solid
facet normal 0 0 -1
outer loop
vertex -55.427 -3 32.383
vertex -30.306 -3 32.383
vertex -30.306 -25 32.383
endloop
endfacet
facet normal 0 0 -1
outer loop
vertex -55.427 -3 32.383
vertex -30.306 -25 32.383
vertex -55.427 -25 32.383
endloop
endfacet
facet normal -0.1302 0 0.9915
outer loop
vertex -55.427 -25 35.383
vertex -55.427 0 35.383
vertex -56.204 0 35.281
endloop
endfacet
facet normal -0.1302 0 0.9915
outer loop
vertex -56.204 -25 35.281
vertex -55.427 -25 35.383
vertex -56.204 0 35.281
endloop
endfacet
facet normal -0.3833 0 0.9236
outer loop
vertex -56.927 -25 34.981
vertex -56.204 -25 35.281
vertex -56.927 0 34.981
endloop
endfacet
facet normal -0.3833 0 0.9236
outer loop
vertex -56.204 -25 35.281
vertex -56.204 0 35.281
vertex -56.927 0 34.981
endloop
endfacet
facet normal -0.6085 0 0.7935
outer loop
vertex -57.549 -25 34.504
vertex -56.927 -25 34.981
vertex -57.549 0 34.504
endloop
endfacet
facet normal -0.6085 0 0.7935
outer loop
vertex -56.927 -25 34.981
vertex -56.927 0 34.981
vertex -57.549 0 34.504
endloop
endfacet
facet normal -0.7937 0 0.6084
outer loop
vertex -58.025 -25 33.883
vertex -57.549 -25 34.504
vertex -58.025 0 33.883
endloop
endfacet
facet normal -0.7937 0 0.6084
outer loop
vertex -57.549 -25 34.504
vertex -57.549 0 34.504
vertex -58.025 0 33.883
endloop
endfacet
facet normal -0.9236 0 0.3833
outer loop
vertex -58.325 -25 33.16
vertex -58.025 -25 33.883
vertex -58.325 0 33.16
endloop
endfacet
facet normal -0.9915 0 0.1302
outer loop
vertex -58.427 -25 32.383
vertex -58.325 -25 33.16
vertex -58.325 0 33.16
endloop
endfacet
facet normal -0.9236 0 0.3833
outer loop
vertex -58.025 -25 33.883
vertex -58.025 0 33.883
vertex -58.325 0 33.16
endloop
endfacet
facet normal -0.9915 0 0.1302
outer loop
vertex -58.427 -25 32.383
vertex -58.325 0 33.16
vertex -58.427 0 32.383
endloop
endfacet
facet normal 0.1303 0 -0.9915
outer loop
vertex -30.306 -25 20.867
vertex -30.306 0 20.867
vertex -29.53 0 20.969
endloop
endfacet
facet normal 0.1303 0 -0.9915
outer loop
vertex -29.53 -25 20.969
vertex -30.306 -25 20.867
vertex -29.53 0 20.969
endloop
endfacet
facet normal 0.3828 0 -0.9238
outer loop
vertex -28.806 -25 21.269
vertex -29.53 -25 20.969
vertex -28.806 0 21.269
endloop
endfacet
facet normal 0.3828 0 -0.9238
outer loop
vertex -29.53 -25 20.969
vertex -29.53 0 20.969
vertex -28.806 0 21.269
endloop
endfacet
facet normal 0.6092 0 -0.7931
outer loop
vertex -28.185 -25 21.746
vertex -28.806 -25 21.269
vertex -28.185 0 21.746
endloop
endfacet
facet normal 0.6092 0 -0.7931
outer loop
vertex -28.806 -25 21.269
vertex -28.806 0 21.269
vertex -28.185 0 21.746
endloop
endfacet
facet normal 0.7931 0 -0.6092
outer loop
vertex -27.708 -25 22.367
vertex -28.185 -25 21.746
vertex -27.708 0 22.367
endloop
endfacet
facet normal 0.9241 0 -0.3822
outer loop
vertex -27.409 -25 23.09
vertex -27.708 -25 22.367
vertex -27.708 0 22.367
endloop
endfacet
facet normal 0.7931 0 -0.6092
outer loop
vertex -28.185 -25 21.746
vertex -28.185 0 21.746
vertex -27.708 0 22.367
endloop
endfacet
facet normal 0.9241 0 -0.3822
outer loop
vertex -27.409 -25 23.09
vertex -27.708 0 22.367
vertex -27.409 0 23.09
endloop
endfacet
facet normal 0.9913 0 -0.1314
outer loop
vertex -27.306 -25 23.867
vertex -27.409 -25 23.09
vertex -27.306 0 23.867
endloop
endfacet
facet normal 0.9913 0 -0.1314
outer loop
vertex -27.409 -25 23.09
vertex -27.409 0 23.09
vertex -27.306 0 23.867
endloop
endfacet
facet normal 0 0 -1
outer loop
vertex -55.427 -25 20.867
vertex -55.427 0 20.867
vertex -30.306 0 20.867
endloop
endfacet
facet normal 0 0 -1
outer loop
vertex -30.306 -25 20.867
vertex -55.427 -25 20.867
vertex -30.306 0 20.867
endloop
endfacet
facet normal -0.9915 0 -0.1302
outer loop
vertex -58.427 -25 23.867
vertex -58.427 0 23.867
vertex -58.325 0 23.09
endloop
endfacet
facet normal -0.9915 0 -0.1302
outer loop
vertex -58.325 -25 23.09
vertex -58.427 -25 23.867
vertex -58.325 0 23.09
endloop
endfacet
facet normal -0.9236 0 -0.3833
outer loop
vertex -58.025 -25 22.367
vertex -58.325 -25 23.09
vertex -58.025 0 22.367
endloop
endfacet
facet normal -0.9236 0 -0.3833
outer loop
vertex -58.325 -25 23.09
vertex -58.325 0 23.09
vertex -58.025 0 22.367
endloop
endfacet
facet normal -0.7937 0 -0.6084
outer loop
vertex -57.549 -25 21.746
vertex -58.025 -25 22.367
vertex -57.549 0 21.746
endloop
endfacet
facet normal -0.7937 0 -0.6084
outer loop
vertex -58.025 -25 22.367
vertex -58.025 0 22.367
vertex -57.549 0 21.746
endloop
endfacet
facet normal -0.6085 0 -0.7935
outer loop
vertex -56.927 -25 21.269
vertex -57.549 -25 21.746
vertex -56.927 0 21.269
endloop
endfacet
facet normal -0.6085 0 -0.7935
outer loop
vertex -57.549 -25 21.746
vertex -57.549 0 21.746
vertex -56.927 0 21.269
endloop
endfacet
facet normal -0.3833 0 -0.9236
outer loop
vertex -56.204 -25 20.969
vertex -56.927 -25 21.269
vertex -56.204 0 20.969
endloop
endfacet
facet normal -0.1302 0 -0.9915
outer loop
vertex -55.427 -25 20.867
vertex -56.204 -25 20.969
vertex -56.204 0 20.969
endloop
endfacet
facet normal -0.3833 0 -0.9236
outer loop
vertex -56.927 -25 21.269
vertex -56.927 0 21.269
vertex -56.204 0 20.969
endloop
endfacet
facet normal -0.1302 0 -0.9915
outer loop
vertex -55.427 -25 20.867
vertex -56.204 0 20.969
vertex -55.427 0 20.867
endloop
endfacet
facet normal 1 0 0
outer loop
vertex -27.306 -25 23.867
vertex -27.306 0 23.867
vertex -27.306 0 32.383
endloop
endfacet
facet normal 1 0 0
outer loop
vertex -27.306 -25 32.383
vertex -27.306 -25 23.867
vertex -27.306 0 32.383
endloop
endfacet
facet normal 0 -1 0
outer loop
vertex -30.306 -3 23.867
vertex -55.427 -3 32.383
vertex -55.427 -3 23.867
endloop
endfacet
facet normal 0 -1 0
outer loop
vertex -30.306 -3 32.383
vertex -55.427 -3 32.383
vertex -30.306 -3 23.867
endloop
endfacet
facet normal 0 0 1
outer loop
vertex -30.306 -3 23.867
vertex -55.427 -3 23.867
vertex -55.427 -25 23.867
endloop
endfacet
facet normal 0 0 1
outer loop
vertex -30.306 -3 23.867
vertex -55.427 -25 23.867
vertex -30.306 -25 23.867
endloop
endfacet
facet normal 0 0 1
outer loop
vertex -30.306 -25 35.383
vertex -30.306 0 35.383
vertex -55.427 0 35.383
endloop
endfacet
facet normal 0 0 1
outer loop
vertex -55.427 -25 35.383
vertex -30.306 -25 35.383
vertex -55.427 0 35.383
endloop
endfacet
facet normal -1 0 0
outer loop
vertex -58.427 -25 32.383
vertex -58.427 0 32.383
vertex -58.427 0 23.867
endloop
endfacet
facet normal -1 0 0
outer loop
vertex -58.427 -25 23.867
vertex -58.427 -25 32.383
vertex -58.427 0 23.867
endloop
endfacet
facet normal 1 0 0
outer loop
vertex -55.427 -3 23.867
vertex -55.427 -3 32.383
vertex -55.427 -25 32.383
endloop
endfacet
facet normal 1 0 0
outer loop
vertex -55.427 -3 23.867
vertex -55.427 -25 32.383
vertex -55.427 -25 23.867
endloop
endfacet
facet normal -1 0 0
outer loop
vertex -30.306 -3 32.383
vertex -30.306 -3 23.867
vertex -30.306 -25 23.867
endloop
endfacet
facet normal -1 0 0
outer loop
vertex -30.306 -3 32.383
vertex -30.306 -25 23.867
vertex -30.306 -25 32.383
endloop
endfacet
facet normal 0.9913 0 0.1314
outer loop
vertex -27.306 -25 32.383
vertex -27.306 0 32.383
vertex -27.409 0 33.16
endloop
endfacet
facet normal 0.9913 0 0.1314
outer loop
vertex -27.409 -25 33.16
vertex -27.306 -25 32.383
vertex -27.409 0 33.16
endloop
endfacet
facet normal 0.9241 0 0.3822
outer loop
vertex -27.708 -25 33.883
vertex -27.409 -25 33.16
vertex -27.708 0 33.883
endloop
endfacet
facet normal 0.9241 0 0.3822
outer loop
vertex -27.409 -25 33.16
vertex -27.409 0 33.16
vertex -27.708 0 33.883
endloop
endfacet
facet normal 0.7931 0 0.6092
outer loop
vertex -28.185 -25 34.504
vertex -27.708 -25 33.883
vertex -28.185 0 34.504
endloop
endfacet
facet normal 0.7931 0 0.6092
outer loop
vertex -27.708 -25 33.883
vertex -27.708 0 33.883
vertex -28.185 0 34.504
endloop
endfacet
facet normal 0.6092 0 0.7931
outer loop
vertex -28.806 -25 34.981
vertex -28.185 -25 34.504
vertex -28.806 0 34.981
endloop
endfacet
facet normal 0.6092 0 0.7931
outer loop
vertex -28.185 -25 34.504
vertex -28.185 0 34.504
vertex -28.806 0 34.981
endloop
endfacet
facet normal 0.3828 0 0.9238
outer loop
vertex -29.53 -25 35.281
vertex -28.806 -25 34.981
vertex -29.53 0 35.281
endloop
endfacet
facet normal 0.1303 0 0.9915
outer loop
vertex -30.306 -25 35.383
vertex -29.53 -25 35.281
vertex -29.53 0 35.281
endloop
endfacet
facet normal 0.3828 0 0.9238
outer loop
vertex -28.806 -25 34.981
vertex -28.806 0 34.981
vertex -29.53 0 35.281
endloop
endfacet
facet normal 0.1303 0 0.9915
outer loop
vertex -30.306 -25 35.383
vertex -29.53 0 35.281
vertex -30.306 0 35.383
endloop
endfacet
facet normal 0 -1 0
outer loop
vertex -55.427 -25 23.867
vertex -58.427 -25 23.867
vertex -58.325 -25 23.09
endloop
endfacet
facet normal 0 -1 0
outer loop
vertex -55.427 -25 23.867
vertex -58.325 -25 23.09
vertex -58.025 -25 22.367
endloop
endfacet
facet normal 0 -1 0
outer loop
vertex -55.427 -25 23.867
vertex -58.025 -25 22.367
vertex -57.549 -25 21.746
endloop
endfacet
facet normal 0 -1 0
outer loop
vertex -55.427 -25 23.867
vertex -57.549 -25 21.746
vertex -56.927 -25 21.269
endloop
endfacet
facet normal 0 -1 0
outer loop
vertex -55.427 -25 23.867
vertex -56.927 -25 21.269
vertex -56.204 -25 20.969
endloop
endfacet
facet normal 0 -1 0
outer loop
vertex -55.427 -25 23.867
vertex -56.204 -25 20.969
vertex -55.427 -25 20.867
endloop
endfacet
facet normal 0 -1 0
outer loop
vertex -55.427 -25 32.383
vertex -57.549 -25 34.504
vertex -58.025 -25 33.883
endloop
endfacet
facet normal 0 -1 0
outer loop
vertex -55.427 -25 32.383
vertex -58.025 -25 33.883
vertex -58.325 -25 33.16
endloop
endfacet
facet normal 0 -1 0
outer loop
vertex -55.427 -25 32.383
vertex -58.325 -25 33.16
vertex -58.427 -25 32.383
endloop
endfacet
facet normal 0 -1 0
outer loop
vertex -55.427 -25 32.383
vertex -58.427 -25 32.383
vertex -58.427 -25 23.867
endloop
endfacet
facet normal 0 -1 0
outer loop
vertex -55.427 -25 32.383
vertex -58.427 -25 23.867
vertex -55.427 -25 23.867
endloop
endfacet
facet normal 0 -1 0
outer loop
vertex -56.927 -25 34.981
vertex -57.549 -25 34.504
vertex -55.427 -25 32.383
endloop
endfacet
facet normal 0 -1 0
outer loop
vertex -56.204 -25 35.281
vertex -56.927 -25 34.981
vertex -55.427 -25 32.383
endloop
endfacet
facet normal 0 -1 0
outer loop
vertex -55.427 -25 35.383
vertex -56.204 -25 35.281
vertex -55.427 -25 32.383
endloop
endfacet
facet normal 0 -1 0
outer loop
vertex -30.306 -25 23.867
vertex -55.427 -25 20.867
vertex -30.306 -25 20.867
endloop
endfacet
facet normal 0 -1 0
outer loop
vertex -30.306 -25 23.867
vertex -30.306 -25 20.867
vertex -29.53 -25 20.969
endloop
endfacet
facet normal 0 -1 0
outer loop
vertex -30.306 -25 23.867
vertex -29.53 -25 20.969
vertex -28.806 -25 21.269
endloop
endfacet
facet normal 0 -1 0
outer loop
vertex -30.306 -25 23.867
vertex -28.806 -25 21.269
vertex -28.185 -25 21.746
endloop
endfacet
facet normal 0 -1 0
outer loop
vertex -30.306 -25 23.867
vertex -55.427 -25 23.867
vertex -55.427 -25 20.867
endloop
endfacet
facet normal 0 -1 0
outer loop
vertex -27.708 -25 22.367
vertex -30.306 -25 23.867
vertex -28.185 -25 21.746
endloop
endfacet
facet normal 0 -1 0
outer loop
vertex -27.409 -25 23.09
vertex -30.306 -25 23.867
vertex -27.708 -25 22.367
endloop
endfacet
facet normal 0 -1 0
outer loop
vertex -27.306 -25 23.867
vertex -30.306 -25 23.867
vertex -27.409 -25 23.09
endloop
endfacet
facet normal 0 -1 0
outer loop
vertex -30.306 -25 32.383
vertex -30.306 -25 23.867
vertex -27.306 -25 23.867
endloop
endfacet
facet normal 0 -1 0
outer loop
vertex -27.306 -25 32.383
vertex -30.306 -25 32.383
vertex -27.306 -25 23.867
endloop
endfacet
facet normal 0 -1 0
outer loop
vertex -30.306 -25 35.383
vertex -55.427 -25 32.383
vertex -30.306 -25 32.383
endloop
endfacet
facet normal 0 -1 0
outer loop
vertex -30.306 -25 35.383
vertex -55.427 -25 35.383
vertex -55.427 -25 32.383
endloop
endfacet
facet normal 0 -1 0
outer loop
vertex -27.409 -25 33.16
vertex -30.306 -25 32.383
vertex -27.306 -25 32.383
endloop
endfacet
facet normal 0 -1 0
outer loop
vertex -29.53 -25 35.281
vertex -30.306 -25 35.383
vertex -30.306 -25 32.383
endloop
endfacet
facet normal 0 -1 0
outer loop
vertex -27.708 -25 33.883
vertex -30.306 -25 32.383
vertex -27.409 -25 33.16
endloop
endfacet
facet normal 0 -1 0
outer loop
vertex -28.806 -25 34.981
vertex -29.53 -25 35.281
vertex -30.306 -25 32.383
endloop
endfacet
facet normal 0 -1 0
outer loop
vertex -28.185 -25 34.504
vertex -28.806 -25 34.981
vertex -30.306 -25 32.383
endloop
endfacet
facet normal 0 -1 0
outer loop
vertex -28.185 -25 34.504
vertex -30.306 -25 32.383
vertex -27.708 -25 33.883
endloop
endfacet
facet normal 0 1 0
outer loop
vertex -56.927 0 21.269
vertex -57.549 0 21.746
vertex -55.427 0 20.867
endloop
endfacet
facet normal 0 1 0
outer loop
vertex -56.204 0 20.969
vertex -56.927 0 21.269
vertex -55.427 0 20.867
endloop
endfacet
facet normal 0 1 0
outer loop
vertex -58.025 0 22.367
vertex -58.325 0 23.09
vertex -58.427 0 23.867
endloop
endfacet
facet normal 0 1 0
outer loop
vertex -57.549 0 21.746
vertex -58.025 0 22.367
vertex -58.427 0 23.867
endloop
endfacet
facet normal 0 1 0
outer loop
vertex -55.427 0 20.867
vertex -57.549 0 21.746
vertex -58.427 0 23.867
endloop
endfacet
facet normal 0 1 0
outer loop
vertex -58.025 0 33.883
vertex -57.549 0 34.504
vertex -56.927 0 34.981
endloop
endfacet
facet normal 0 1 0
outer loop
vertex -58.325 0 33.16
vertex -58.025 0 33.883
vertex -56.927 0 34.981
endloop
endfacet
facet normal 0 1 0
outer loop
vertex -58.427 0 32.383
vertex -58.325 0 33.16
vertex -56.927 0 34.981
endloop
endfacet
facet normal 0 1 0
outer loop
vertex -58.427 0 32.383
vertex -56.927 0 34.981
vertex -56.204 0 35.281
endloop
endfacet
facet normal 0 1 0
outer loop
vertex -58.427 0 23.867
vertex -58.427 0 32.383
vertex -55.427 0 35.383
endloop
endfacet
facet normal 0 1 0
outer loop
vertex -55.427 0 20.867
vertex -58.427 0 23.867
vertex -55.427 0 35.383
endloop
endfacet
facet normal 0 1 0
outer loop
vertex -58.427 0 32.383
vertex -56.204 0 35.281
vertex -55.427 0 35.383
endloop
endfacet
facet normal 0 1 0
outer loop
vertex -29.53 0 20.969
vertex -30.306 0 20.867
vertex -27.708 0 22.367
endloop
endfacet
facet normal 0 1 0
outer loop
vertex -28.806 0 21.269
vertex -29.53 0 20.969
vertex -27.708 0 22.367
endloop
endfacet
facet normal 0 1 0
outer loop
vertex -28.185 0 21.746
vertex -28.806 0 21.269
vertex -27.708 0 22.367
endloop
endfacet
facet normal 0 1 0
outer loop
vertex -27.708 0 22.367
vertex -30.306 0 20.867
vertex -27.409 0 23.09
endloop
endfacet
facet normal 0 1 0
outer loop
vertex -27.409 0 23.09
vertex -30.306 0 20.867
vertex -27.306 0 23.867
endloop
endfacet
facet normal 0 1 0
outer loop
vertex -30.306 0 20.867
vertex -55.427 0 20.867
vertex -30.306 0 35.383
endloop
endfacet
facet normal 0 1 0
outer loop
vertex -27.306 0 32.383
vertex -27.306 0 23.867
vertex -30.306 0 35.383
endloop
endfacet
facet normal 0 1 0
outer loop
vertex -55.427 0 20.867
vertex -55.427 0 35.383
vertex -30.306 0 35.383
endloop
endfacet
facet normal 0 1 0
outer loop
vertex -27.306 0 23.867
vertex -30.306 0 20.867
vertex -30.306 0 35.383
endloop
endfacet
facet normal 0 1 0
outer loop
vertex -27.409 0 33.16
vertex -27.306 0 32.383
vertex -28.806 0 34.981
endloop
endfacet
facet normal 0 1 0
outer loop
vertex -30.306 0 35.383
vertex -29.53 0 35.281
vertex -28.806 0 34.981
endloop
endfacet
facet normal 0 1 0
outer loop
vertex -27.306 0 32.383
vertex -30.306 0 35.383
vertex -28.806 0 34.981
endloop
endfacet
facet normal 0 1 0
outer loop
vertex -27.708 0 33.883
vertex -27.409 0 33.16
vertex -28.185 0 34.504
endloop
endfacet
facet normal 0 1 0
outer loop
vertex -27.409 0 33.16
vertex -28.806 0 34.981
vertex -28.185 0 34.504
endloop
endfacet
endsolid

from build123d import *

# Parameters (mm, degrees)
F1_DEPTH = 25
F2_T     = 3


# Not quite as in the source:
# - a shell that OpenCascade refuses in one call is made with other operations: the cavity is built on its own and cut out


with BuildPart() as f1:
    # F0 (on Front) → F1 (new body)
    with BuildSketch(Plane.XZ):
        with BuildLine():
            Line((-30.3064525574, 35.3830642998), (-55.4274195135, 35.3830642998))
            ThreePointArc((-55.4274195135, 35.3830642998), (-57.548739857, 34.5043846434), (-58.4274195135, 32.3830642998))
            Line((-58.4274195135, 32.3830642998), (-58.4274195135, 23.8669360727))
            ThreePointArc((-58.4274195135, 23.8669360727), (-57.548739857, 21.7456157291), (-55.4274195135, 20.8669360727))
            Line((-55.4274195135, 20.8669360727), (-30.3064525574, 20.8669360727))
            ThreePointArc((-30.3064525574, 20.8669360727), (-28.1851322139, 21.7456157291), (-27.3064525574, 23.8669360727))
            Line((-27.3064525574, 23.8669360727), (-27.3064525574, 32.3830642998))
            ThreePointArc((-27.3064525574, 32.3830642998), (-28.1851322139, 34.5043846434), (-30.3064525574, 35.3830642998))
        make_face()
    extrude(amount=F1_DEPTH)

    # F2: shell of thickness 3, made by hand


with BuildPart() as f2_core1:
    # F2_t2: copy of F1
    add(f1.part)

    # the walls: a layer under each face that stays
    f2_faces = [f2_core1.faces().sort_by_distance(p)[0] for p in [
        (-42.8669360355, -12.5, 35.3830642998),
        (-58.4274195135, -12.5, 28.1250001863),
        (-42.8669360355, -12.5, 20.8669360727),
        (-27.3064525574, -12.5, 28.1250001863),
        (-42.8669360355, 0, 28.1250001863),
    ]]
    thicken(f2_faces, amount=-F2_T, mode=Mode.SUBTRACT)


with BuildPart() as f1_1:
    add(f1.part)

    # what is left inside the walls is the cavity
    f2_cavity = [f2_core1.part.solids().sort_by_distance(p)[0] for p in [
        (-42.866936, -17.666667, 23.896936),
    ]]
    add(f2_cavity, mode=Mode.SUBTRACT)


solid = f1_1.part
